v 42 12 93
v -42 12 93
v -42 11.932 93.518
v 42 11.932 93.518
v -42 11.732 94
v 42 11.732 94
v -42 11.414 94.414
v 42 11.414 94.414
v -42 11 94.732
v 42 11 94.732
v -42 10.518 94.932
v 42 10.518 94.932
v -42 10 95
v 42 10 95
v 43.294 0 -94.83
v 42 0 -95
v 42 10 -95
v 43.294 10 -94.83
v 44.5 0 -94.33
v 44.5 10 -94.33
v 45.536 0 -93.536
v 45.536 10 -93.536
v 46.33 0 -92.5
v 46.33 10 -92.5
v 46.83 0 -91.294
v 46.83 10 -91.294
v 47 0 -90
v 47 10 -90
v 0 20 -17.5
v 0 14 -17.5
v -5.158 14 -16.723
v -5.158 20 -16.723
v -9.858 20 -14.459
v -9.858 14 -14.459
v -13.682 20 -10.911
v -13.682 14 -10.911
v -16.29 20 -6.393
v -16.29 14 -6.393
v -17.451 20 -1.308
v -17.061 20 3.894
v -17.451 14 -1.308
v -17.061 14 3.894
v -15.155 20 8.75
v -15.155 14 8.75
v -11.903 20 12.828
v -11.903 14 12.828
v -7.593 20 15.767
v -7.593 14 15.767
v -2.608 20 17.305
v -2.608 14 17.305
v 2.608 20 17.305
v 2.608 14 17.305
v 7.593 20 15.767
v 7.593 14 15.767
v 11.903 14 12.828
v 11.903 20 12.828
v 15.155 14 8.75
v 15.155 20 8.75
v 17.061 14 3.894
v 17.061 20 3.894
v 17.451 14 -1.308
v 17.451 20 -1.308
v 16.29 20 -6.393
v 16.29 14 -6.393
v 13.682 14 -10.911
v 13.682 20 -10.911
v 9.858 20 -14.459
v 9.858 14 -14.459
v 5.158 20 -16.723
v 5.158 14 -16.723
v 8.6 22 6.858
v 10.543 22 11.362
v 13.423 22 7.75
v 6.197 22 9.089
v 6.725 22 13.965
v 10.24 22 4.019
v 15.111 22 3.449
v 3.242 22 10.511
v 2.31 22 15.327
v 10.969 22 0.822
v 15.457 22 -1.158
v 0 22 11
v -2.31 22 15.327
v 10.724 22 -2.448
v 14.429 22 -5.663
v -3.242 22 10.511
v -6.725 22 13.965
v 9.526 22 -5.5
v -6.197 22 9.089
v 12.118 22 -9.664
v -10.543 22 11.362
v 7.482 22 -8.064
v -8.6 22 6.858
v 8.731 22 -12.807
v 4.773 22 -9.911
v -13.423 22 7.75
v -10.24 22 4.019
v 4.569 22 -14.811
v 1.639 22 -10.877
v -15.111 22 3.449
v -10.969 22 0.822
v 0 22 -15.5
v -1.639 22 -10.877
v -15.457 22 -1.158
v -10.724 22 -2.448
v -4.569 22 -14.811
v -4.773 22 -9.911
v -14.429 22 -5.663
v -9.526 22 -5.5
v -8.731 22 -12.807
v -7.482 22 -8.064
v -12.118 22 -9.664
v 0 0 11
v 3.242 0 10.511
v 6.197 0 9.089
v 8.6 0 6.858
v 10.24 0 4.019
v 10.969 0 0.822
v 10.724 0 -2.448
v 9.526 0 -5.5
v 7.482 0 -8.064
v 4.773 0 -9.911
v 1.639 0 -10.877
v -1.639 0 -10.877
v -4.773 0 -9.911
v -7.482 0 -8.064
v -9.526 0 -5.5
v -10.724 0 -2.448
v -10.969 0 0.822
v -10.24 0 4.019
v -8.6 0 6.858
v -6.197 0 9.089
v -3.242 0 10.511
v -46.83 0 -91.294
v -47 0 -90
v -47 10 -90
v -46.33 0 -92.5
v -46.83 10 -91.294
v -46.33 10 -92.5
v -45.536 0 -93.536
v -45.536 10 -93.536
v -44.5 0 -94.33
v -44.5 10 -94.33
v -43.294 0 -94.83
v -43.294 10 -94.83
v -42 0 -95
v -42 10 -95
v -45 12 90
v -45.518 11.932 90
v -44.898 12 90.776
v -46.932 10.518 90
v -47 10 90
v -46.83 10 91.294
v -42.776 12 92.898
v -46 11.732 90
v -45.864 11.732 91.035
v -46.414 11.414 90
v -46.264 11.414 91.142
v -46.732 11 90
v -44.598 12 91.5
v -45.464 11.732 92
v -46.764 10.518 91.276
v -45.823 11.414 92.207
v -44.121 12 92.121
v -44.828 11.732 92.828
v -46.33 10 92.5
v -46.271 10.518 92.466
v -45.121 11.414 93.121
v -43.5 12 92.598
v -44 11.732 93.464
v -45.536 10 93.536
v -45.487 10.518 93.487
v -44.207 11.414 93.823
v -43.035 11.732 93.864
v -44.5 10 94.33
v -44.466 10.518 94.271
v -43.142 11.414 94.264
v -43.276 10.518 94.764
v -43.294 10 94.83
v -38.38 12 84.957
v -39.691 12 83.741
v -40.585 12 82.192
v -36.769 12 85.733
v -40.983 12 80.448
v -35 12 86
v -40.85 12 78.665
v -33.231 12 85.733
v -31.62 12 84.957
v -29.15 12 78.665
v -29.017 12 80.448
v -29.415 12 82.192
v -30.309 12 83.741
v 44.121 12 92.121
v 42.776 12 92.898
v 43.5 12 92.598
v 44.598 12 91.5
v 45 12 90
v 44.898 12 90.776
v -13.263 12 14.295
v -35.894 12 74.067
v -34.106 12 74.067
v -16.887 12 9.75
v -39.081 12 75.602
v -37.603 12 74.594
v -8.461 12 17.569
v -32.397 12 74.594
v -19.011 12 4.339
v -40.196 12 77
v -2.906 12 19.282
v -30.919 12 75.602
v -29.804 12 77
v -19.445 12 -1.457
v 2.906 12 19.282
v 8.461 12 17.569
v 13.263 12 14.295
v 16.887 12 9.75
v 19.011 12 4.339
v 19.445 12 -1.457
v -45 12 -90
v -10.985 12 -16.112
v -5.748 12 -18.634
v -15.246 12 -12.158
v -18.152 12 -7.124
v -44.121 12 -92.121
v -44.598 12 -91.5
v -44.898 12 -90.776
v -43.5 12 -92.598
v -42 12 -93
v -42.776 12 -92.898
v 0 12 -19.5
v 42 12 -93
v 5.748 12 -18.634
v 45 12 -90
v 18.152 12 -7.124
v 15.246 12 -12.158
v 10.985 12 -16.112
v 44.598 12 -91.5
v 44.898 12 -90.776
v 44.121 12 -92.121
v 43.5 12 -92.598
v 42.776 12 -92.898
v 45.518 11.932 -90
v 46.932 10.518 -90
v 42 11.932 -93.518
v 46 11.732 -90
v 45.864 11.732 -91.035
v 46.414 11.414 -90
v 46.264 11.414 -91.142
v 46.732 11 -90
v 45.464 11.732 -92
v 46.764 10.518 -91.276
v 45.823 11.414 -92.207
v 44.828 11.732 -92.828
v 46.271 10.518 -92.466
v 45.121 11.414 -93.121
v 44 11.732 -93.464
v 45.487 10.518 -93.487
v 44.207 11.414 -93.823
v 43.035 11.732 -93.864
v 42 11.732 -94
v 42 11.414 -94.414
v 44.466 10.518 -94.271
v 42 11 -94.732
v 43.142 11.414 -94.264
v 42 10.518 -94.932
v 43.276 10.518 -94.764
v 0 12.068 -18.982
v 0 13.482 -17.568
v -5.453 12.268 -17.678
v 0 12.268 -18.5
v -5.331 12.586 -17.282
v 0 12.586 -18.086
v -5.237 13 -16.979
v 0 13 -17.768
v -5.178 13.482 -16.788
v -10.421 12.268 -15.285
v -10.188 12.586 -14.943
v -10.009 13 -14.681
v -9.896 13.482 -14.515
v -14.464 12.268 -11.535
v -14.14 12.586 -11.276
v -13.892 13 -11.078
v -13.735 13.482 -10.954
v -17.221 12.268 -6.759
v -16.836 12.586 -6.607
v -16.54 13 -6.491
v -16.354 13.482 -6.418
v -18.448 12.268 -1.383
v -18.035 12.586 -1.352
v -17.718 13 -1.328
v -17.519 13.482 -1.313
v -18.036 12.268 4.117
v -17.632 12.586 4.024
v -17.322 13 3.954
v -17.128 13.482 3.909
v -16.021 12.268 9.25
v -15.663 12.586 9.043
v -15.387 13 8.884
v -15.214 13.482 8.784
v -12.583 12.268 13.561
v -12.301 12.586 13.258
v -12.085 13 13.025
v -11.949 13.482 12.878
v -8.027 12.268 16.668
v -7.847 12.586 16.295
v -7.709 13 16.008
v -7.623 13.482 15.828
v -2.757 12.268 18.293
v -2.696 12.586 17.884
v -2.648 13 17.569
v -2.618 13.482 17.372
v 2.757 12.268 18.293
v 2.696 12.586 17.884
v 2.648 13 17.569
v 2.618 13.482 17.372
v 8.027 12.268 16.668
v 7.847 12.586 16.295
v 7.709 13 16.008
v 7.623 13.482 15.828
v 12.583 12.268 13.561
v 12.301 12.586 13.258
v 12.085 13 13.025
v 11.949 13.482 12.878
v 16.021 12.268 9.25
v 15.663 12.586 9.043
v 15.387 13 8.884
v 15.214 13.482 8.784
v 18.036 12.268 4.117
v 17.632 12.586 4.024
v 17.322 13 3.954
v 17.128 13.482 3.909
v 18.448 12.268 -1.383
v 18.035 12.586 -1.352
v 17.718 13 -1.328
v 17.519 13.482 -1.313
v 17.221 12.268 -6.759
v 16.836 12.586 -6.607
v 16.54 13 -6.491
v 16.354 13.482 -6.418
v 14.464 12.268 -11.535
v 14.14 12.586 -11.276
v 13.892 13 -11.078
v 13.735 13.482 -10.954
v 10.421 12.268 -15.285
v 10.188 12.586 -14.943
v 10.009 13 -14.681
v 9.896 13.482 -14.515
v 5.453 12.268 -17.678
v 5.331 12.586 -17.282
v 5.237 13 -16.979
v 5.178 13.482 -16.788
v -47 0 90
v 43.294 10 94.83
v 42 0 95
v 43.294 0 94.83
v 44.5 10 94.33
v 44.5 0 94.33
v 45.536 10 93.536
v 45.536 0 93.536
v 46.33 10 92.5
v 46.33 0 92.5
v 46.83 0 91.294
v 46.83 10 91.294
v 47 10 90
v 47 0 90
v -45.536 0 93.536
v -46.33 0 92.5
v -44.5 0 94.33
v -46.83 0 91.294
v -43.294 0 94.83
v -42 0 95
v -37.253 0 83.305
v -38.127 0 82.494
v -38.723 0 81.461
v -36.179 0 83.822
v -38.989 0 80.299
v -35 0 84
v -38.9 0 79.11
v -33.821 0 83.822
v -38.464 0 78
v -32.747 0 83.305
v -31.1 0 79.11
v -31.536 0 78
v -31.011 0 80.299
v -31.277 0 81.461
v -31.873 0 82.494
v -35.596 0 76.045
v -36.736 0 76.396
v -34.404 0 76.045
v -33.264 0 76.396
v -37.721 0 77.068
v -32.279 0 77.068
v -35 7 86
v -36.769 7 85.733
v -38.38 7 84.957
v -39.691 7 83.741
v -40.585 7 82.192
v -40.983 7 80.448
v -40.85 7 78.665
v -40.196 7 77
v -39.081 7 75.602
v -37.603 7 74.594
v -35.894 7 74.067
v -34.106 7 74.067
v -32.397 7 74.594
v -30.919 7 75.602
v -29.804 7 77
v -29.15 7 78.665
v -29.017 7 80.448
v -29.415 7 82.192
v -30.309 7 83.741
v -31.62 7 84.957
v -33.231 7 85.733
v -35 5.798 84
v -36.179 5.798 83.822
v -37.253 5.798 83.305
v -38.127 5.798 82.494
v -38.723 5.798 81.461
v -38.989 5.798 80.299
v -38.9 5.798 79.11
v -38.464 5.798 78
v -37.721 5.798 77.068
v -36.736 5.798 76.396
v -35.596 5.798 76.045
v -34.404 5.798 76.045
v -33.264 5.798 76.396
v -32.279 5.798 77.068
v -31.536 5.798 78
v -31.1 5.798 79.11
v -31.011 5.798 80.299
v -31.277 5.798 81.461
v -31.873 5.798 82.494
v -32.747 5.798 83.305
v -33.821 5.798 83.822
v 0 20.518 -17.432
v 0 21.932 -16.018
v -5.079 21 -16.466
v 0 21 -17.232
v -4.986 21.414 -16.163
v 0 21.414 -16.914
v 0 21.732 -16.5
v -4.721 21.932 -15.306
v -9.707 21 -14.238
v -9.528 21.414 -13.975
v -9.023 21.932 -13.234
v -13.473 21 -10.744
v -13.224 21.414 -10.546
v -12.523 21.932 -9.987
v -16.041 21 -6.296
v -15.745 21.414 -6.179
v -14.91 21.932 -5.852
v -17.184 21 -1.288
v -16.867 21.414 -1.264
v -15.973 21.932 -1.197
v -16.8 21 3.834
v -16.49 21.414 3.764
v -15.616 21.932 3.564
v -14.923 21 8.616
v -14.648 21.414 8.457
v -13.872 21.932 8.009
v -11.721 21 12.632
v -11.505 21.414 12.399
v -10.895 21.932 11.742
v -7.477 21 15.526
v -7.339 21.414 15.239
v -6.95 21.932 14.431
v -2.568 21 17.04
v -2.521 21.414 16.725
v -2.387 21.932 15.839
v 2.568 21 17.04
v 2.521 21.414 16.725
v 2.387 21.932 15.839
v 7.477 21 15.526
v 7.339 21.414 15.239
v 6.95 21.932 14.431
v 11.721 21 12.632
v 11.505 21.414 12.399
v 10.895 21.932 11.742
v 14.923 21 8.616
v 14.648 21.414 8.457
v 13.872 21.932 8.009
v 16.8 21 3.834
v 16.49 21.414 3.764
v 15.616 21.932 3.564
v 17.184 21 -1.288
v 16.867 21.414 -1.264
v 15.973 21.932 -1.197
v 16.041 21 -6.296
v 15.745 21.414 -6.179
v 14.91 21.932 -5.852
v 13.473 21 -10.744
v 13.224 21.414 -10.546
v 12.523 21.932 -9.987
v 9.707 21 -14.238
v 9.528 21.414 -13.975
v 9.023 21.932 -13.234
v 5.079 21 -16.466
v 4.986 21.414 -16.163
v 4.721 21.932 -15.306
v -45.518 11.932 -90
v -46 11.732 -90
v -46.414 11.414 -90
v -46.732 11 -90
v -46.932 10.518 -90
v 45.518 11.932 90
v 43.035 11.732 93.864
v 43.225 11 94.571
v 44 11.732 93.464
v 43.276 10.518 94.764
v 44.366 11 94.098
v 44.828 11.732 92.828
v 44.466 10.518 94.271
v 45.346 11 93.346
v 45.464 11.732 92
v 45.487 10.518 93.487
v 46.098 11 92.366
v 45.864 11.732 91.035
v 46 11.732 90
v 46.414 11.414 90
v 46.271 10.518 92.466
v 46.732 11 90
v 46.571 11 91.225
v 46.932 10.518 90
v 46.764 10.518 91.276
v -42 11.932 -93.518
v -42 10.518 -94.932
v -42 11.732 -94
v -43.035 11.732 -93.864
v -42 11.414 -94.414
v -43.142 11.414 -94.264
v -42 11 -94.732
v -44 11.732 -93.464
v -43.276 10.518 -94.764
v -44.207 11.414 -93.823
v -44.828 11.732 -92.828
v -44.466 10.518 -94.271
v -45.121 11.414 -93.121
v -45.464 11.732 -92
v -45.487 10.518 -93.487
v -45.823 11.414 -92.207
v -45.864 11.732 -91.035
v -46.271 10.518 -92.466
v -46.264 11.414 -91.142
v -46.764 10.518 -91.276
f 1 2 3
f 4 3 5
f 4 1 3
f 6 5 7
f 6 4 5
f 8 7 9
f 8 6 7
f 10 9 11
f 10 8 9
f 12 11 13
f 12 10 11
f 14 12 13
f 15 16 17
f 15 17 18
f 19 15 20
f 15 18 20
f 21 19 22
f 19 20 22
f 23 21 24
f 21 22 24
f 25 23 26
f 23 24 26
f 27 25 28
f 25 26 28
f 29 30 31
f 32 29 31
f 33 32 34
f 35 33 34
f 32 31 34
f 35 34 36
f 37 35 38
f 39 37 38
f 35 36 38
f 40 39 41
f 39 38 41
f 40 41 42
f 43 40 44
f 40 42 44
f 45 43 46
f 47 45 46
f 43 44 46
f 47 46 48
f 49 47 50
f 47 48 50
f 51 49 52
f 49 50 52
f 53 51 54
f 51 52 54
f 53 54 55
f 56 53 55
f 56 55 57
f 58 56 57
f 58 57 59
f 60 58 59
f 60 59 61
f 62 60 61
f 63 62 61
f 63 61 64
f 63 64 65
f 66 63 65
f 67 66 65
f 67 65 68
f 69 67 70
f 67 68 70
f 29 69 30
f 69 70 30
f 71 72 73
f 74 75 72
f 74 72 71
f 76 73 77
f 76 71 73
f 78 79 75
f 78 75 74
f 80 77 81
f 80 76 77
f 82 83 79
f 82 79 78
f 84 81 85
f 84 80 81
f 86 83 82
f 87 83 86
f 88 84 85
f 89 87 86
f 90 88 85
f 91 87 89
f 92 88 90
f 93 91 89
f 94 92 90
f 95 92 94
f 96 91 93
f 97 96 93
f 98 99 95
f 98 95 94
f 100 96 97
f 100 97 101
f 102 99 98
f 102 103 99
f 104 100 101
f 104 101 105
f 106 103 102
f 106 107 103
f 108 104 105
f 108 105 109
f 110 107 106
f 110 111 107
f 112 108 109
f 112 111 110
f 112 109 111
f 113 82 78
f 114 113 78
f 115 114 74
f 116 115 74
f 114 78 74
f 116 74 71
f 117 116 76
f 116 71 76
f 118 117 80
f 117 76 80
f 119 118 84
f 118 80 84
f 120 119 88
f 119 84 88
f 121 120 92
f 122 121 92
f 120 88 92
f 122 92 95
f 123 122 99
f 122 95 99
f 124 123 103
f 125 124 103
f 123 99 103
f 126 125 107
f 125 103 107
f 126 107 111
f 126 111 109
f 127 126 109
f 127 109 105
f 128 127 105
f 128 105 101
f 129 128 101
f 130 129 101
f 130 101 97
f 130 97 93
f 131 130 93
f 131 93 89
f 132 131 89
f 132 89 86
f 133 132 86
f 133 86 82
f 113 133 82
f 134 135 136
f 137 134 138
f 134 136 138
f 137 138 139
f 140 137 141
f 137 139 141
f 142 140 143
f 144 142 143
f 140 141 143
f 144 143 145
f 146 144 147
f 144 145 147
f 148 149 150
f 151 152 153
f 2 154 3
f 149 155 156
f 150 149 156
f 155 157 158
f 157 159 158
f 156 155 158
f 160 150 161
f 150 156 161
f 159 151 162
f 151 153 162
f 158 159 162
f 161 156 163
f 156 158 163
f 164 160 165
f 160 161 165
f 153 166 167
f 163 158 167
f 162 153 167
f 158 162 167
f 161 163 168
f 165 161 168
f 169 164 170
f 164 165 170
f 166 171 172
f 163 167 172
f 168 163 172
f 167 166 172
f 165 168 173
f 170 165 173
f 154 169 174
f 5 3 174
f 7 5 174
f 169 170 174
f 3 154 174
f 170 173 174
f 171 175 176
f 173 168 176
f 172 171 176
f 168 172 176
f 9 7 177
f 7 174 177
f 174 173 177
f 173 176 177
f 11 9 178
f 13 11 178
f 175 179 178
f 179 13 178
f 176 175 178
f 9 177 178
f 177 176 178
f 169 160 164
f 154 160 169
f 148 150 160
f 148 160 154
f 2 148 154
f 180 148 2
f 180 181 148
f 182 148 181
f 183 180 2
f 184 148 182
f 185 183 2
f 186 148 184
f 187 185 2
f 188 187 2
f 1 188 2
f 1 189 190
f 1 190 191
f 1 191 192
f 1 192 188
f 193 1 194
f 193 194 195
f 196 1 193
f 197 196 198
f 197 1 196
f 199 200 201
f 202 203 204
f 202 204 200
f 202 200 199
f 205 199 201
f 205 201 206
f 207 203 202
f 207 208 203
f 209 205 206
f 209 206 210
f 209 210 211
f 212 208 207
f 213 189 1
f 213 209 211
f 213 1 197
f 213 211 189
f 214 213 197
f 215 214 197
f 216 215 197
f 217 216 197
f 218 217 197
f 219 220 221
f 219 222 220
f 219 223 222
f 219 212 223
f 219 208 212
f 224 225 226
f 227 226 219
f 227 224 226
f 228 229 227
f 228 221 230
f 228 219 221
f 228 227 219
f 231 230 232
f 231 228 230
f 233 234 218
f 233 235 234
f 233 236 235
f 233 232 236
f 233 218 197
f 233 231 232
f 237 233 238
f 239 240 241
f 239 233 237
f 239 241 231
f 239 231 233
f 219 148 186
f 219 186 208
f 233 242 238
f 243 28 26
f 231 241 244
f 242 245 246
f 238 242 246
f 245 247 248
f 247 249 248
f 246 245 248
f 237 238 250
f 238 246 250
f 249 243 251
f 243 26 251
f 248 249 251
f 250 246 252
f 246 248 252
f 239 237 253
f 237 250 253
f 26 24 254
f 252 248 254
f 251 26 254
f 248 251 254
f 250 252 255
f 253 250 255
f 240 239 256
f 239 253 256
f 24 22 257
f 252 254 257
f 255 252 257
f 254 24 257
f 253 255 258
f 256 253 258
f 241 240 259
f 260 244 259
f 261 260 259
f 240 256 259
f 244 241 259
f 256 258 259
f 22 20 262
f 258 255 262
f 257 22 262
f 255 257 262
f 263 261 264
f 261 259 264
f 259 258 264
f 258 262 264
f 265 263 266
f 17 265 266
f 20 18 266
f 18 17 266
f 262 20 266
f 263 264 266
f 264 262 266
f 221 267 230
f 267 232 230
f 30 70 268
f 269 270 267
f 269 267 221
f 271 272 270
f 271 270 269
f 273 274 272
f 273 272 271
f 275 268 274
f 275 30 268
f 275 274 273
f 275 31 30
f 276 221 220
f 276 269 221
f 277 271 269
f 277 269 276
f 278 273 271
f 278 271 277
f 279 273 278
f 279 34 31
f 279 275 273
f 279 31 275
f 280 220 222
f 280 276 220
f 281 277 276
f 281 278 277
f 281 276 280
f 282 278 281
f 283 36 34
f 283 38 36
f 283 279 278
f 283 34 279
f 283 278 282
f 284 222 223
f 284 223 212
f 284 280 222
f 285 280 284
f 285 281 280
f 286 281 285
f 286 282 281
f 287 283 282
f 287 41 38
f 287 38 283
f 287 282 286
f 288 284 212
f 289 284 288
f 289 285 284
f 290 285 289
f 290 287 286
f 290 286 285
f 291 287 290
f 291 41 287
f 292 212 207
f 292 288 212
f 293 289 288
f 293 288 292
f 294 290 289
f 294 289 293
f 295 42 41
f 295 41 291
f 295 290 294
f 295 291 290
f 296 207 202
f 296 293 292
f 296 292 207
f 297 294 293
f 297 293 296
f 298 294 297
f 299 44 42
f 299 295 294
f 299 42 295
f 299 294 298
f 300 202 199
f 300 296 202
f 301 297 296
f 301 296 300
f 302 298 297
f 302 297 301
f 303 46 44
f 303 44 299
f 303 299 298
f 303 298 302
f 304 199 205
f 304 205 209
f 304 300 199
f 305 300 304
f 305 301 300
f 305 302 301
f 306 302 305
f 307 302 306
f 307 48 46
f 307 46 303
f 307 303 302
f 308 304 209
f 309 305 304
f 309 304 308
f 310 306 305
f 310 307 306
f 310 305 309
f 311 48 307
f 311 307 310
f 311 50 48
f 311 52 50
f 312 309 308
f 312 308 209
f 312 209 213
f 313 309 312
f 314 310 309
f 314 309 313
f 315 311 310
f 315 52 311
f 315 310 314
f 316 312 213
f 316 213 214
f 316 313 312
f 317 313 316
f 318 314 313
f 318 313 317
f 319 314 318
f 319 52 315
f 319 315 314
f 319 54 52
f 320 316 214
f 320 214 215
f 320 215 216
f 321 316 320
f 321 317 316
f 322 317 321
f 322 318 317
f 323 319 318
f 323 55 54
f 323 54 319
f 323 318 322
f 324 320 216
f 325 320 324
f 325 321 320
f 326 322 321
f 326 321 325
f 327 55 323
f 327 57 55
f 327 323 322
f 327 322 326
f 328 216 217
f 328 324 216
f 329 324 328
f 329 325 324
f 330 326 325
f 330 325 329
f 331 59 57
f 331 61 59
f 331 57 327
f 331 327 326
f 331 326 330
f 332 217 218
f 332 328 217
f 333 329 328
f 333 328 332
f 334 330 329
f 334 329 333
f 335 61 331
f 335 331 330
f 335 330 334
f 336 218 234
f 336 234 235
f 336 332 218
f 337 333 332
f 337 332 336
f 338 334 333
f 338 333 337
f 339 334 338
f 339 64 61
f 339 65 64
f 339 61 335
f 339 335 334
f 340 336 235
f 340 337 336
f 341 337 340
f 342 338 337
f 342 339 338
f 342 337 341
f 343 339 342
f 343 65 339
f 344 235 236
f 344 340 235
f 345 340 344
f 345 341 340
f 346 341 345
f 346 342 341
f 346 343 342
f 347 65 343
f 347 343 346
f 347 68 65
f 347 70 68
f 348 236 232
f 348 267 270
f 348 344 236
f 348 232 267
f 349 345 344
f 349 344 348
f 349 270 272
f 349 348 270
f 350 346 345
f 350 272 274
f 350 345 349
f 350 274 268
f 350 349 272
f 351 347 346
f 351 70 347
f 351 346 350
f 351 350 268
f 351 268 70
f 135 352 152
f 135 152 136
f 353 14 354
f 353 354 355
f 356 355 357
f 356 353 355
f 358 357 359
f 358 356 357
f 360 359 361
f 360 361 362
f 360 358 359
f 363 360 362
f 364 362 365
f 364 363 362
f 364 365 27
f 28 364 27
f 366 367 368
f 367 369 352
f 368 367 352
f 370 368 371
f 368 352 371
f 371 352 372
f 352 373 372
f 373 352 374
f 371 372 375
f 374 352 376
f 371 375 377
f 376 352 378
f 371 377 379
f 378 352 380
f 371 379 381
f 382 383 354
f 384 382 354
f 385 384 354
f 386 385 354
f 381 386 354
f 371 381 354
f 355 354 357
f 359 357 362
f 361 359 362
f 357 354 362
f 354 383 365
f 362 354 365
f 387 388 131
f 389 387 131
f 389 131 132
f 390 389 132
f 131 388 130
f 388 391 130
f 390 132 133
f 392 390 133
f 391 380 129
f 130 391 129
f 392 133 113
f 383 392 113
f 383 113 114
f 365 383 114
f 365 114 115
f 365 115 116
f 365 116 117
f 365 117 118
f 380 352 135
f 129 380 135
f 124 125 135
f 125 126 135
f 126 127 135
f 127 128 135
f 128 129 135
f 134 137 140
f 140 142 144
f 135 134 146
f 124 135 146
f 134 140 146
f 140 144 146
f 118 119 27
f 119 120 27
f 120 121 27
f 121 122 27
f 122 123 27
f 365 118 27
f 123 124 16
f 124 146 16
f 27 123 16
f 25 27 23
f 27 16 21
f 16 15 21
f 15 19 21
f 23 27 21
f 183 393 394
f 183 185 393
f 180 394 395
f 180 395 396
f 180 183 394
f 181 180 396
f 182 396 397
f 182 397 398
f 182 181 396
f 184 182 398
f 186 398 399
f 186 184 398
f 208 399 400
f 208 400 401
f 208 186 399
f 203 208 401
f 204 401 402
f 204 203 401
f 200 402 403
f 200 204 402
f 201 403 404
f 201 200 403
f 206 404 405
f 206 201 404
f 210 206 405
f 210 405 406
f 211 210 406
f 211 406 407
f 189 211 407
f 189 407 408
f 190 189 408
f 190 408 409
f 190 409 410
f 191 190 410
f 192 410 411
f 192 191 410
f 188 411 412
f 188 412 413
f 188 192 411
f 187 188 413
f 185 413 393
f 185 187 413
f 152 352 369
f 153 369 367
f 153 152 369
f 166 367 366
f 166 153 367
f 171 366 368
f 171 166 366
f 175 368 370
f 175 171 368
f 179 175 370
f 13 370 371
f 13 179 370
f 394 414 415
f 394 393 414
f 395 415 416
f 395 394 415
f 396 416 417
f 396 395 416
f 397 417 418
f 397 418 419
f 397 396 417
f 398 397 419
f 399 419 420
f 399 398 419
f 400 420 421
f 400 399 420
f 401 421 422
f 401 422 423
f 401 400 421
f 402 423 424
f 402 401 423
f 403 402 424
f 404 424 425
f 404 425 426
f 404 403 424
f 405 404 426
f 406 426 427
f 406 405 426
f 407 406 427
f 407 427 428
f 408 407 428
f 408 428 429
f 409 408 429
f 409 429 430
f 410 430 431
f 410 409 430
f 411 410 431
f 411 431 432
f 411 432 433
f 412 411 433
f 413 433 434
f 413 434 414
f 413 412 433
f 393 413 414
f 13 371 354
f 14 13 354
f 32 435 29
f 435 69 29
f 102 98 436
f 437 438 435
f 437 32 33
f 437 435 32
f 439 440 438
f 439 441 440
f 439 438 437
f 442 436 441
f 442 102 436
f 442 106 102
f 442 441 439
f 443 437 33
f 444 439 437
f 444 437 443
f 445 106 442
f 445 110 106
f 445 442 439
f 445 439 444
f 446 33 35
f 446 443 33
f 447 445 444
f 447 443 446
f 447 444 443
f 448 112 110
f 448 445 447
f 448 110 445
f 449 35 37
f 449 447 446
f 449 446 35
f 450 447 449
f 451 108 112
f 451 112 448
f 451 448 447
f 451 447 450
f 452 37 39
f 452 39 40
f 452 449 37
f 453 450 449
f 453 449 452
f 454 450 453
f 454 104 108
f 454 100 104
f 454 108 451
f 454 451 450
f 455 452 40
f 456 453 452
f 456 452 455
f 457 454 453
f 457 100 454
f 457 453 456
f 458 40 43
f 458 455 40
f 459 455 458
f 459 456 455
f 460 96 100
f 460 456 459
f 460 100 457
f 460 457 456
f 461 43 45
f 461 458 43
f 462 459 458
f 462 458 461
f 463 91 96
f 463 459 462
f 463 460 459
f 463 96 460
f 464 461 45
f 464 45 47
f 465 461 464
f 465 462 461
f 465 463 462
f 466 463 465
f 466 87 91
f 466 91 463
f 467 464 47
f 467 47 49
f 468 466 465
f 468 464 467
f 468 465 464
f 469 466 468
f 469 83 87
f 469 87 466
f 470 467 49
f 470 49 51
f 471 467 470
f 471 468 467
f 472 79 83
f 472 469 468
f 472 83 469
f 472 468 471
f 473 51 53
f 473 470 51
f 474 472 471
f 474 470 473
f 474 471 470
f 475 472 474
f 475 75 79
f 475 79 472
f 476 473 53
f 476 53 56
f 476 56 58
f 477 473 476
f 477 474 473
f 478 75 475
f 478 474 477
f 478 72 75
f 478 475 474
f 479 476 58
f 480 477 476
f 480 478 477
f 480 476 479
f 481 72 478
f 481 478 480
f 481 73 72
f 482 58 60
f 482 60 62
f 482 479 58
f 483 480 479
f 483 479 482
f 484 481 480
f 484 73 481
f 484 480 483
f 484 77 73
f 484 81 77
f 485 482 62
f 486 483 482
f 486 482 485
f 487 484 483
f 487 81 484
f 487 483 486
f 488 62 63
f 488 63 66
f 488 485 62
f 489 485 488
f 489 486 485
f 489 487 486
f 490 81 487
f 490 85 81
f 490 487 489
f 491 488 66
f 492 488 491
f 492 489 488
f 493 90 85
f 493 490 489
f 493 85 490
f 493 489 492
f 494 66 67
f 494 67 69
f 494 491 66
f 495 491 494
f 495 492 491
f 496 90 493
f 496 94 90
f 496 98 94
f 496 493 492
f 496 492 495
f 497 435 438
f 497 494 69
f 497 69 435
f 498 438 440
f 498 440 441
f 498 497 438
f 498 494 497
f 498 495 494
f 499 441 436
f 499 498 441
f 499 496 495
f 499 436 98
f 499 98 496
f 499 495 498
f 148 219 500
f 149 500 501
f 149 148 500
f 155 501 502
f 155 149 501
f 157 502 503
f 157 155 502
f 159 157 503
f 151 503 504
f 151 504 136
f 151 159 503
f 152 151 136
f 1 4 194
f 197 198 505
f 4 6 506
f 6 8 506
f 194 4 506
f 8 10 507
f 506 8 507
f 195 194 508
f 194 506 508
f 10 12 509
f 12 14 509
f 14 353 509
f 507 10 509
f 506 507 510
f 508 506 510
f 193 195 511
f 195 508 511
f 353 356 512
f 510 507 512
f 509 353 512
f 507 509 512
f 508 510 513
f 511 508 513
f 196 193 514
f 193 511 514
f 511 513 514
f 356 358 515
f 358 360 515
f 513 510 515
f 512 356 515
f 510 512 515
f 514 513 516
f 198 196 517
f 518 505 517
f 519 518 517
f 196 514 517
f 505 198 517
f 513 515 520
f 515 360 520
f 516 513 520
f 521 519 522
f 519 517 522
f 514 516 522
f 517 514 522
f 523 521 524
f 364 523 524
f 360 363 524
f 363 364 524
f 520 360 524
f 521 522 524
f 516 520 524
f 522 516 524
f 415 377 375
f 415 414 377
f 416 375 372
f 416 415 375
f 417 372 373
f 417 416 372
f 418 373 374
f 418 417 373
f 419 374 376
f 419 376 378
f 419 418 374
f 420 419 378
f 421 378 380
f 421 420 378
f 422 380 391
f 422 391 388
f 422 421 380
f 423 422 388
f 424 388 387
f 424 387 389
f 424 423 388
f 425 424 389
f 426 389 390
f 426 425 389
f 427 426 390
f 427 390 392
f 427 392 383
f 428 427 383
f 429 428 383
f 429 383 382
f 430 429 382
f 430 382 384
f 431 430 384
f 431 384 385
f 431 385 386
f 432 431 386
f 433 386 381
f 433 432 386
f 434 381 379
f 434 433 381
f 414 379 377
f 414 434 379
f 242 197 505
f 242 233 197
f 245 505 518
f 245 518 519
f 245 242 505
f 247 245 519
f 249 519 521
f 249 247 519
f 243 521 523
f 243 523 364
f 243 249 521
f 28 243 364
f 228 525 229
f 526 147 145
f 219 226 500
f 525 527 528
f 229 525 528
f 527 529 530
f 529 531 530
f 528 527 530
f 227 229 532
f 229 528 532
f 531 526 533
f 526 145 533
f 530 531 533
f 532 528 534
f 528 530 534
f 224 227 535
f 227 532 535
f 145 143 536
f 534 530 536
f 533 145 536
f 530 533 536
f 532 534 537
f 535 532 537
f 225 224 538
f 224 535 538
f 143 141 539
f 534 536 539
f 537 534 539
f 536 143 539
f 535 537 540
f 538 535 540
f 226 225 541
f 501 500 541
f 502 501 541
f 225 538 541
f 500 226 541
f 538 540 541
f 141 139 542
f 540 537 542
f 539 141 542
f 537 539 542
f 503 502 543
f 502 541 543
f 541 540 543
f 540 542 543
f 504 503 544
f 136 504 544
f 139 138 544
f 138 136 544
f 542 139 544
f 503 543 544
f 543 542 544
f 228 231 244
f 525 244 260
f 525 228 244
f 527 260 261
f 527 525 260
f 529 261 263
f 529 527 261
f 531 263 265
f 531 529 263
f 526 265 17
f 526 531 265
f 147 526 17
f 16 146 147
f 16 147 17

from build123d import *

# Parameters (mm, degrees)
SKETCH1_W         = 94
SKETCH1_H         = 190
PLATE_DEPTH       = 12
SKETCH2_R         = 17.5
BOSS_DEPTH        = 10
SKETCH3_R         = 11
CENTER_HOLE_DEPTH = 109.249711316
FILLET_R5_R       = 5
FILLET_R2_R       = 2


with BuildPart() as part:
    # Sketch1 → plate (new body)
    with BuildSketch(Plane(origin=(0, 0, 0), x_dir=(1, 0, 0), z_dir=(0, 1, 0))):
        Rectangle(SKETCH1_W, SKETCH1_H)
    extrude(amount=PLATE_DEPTH)

    # Sketch2 → boss (add)
    with BuildSketch(Plane(origin=(0, 12, 0), x_dir=(-1, 0, 0), z_dir=(0, 1, 0))):
        with Locations(Location((0, 0, 0), (0, 0, 270))):
            Circle(SKETCH2_R)
    extrude(amount=BOSS_DEPTH)

    # Sketch3 → center hole (cut, through all)
    with BuildSketch(Plane(origin=(0, 22, 0), x_dir=(-1, 0, 0), z_dir=(0, 1, 0))):
        with Locations(Location((0, 0, 0), (0, 0, 90))):
            Circle(SKETCH3_R)
    extrude(amount=-CENTER_HOLE_DEPTH, mode=Mode.SUBTRACT)

    # Sketch4 → pattern hole (revolve, cut)
    with BuildSketch(Plane(origin=(-35, 12, 80), x_dir=(0, 0, 1), z_dir=(1, 0, 0))):
        Polygon((0, 0), (0, 12), (4, 12), (4, 6.201721238), (6, 5), (6, 0), align=None)
    revolve(axis=Axis((-35, 18.130023899, 80), (0, -1, 0)), mode=Mode.SUBTRACT)

    # Fillet R5
    fillet_r5_edges = [part.edges().sort_by_distance(p)[0] for p in [
        (-47, 6, -95),
        (47, 6, -95),
        (47, 6, 95),
        (-47, 6, 95),
    ]]
    fillet(fillet_r5_edges, radius=FILLET_R5_R)

    # Fillet R2
    fillet_r2_edges = [part.edges().sort_by_distance(p)[0] for p in [
        (0, 12, 17.5),
        (0, 22, 17.5),
        (47, 12, 0),
        (0, 12, 95),
        (-47, 12, 0),
        (0, 12, -95),
        (45.535533906, 12, -93.535533906),
        (-45.535533906, 12, -93.535533906),
        (-45.535533906, 12, 93.535533906),
        (45.535533906, 12, 93.535533906),
    ]]
    fillet(fillet_r2_edges, radius=FILLET_R2_R)


solid = part.part
